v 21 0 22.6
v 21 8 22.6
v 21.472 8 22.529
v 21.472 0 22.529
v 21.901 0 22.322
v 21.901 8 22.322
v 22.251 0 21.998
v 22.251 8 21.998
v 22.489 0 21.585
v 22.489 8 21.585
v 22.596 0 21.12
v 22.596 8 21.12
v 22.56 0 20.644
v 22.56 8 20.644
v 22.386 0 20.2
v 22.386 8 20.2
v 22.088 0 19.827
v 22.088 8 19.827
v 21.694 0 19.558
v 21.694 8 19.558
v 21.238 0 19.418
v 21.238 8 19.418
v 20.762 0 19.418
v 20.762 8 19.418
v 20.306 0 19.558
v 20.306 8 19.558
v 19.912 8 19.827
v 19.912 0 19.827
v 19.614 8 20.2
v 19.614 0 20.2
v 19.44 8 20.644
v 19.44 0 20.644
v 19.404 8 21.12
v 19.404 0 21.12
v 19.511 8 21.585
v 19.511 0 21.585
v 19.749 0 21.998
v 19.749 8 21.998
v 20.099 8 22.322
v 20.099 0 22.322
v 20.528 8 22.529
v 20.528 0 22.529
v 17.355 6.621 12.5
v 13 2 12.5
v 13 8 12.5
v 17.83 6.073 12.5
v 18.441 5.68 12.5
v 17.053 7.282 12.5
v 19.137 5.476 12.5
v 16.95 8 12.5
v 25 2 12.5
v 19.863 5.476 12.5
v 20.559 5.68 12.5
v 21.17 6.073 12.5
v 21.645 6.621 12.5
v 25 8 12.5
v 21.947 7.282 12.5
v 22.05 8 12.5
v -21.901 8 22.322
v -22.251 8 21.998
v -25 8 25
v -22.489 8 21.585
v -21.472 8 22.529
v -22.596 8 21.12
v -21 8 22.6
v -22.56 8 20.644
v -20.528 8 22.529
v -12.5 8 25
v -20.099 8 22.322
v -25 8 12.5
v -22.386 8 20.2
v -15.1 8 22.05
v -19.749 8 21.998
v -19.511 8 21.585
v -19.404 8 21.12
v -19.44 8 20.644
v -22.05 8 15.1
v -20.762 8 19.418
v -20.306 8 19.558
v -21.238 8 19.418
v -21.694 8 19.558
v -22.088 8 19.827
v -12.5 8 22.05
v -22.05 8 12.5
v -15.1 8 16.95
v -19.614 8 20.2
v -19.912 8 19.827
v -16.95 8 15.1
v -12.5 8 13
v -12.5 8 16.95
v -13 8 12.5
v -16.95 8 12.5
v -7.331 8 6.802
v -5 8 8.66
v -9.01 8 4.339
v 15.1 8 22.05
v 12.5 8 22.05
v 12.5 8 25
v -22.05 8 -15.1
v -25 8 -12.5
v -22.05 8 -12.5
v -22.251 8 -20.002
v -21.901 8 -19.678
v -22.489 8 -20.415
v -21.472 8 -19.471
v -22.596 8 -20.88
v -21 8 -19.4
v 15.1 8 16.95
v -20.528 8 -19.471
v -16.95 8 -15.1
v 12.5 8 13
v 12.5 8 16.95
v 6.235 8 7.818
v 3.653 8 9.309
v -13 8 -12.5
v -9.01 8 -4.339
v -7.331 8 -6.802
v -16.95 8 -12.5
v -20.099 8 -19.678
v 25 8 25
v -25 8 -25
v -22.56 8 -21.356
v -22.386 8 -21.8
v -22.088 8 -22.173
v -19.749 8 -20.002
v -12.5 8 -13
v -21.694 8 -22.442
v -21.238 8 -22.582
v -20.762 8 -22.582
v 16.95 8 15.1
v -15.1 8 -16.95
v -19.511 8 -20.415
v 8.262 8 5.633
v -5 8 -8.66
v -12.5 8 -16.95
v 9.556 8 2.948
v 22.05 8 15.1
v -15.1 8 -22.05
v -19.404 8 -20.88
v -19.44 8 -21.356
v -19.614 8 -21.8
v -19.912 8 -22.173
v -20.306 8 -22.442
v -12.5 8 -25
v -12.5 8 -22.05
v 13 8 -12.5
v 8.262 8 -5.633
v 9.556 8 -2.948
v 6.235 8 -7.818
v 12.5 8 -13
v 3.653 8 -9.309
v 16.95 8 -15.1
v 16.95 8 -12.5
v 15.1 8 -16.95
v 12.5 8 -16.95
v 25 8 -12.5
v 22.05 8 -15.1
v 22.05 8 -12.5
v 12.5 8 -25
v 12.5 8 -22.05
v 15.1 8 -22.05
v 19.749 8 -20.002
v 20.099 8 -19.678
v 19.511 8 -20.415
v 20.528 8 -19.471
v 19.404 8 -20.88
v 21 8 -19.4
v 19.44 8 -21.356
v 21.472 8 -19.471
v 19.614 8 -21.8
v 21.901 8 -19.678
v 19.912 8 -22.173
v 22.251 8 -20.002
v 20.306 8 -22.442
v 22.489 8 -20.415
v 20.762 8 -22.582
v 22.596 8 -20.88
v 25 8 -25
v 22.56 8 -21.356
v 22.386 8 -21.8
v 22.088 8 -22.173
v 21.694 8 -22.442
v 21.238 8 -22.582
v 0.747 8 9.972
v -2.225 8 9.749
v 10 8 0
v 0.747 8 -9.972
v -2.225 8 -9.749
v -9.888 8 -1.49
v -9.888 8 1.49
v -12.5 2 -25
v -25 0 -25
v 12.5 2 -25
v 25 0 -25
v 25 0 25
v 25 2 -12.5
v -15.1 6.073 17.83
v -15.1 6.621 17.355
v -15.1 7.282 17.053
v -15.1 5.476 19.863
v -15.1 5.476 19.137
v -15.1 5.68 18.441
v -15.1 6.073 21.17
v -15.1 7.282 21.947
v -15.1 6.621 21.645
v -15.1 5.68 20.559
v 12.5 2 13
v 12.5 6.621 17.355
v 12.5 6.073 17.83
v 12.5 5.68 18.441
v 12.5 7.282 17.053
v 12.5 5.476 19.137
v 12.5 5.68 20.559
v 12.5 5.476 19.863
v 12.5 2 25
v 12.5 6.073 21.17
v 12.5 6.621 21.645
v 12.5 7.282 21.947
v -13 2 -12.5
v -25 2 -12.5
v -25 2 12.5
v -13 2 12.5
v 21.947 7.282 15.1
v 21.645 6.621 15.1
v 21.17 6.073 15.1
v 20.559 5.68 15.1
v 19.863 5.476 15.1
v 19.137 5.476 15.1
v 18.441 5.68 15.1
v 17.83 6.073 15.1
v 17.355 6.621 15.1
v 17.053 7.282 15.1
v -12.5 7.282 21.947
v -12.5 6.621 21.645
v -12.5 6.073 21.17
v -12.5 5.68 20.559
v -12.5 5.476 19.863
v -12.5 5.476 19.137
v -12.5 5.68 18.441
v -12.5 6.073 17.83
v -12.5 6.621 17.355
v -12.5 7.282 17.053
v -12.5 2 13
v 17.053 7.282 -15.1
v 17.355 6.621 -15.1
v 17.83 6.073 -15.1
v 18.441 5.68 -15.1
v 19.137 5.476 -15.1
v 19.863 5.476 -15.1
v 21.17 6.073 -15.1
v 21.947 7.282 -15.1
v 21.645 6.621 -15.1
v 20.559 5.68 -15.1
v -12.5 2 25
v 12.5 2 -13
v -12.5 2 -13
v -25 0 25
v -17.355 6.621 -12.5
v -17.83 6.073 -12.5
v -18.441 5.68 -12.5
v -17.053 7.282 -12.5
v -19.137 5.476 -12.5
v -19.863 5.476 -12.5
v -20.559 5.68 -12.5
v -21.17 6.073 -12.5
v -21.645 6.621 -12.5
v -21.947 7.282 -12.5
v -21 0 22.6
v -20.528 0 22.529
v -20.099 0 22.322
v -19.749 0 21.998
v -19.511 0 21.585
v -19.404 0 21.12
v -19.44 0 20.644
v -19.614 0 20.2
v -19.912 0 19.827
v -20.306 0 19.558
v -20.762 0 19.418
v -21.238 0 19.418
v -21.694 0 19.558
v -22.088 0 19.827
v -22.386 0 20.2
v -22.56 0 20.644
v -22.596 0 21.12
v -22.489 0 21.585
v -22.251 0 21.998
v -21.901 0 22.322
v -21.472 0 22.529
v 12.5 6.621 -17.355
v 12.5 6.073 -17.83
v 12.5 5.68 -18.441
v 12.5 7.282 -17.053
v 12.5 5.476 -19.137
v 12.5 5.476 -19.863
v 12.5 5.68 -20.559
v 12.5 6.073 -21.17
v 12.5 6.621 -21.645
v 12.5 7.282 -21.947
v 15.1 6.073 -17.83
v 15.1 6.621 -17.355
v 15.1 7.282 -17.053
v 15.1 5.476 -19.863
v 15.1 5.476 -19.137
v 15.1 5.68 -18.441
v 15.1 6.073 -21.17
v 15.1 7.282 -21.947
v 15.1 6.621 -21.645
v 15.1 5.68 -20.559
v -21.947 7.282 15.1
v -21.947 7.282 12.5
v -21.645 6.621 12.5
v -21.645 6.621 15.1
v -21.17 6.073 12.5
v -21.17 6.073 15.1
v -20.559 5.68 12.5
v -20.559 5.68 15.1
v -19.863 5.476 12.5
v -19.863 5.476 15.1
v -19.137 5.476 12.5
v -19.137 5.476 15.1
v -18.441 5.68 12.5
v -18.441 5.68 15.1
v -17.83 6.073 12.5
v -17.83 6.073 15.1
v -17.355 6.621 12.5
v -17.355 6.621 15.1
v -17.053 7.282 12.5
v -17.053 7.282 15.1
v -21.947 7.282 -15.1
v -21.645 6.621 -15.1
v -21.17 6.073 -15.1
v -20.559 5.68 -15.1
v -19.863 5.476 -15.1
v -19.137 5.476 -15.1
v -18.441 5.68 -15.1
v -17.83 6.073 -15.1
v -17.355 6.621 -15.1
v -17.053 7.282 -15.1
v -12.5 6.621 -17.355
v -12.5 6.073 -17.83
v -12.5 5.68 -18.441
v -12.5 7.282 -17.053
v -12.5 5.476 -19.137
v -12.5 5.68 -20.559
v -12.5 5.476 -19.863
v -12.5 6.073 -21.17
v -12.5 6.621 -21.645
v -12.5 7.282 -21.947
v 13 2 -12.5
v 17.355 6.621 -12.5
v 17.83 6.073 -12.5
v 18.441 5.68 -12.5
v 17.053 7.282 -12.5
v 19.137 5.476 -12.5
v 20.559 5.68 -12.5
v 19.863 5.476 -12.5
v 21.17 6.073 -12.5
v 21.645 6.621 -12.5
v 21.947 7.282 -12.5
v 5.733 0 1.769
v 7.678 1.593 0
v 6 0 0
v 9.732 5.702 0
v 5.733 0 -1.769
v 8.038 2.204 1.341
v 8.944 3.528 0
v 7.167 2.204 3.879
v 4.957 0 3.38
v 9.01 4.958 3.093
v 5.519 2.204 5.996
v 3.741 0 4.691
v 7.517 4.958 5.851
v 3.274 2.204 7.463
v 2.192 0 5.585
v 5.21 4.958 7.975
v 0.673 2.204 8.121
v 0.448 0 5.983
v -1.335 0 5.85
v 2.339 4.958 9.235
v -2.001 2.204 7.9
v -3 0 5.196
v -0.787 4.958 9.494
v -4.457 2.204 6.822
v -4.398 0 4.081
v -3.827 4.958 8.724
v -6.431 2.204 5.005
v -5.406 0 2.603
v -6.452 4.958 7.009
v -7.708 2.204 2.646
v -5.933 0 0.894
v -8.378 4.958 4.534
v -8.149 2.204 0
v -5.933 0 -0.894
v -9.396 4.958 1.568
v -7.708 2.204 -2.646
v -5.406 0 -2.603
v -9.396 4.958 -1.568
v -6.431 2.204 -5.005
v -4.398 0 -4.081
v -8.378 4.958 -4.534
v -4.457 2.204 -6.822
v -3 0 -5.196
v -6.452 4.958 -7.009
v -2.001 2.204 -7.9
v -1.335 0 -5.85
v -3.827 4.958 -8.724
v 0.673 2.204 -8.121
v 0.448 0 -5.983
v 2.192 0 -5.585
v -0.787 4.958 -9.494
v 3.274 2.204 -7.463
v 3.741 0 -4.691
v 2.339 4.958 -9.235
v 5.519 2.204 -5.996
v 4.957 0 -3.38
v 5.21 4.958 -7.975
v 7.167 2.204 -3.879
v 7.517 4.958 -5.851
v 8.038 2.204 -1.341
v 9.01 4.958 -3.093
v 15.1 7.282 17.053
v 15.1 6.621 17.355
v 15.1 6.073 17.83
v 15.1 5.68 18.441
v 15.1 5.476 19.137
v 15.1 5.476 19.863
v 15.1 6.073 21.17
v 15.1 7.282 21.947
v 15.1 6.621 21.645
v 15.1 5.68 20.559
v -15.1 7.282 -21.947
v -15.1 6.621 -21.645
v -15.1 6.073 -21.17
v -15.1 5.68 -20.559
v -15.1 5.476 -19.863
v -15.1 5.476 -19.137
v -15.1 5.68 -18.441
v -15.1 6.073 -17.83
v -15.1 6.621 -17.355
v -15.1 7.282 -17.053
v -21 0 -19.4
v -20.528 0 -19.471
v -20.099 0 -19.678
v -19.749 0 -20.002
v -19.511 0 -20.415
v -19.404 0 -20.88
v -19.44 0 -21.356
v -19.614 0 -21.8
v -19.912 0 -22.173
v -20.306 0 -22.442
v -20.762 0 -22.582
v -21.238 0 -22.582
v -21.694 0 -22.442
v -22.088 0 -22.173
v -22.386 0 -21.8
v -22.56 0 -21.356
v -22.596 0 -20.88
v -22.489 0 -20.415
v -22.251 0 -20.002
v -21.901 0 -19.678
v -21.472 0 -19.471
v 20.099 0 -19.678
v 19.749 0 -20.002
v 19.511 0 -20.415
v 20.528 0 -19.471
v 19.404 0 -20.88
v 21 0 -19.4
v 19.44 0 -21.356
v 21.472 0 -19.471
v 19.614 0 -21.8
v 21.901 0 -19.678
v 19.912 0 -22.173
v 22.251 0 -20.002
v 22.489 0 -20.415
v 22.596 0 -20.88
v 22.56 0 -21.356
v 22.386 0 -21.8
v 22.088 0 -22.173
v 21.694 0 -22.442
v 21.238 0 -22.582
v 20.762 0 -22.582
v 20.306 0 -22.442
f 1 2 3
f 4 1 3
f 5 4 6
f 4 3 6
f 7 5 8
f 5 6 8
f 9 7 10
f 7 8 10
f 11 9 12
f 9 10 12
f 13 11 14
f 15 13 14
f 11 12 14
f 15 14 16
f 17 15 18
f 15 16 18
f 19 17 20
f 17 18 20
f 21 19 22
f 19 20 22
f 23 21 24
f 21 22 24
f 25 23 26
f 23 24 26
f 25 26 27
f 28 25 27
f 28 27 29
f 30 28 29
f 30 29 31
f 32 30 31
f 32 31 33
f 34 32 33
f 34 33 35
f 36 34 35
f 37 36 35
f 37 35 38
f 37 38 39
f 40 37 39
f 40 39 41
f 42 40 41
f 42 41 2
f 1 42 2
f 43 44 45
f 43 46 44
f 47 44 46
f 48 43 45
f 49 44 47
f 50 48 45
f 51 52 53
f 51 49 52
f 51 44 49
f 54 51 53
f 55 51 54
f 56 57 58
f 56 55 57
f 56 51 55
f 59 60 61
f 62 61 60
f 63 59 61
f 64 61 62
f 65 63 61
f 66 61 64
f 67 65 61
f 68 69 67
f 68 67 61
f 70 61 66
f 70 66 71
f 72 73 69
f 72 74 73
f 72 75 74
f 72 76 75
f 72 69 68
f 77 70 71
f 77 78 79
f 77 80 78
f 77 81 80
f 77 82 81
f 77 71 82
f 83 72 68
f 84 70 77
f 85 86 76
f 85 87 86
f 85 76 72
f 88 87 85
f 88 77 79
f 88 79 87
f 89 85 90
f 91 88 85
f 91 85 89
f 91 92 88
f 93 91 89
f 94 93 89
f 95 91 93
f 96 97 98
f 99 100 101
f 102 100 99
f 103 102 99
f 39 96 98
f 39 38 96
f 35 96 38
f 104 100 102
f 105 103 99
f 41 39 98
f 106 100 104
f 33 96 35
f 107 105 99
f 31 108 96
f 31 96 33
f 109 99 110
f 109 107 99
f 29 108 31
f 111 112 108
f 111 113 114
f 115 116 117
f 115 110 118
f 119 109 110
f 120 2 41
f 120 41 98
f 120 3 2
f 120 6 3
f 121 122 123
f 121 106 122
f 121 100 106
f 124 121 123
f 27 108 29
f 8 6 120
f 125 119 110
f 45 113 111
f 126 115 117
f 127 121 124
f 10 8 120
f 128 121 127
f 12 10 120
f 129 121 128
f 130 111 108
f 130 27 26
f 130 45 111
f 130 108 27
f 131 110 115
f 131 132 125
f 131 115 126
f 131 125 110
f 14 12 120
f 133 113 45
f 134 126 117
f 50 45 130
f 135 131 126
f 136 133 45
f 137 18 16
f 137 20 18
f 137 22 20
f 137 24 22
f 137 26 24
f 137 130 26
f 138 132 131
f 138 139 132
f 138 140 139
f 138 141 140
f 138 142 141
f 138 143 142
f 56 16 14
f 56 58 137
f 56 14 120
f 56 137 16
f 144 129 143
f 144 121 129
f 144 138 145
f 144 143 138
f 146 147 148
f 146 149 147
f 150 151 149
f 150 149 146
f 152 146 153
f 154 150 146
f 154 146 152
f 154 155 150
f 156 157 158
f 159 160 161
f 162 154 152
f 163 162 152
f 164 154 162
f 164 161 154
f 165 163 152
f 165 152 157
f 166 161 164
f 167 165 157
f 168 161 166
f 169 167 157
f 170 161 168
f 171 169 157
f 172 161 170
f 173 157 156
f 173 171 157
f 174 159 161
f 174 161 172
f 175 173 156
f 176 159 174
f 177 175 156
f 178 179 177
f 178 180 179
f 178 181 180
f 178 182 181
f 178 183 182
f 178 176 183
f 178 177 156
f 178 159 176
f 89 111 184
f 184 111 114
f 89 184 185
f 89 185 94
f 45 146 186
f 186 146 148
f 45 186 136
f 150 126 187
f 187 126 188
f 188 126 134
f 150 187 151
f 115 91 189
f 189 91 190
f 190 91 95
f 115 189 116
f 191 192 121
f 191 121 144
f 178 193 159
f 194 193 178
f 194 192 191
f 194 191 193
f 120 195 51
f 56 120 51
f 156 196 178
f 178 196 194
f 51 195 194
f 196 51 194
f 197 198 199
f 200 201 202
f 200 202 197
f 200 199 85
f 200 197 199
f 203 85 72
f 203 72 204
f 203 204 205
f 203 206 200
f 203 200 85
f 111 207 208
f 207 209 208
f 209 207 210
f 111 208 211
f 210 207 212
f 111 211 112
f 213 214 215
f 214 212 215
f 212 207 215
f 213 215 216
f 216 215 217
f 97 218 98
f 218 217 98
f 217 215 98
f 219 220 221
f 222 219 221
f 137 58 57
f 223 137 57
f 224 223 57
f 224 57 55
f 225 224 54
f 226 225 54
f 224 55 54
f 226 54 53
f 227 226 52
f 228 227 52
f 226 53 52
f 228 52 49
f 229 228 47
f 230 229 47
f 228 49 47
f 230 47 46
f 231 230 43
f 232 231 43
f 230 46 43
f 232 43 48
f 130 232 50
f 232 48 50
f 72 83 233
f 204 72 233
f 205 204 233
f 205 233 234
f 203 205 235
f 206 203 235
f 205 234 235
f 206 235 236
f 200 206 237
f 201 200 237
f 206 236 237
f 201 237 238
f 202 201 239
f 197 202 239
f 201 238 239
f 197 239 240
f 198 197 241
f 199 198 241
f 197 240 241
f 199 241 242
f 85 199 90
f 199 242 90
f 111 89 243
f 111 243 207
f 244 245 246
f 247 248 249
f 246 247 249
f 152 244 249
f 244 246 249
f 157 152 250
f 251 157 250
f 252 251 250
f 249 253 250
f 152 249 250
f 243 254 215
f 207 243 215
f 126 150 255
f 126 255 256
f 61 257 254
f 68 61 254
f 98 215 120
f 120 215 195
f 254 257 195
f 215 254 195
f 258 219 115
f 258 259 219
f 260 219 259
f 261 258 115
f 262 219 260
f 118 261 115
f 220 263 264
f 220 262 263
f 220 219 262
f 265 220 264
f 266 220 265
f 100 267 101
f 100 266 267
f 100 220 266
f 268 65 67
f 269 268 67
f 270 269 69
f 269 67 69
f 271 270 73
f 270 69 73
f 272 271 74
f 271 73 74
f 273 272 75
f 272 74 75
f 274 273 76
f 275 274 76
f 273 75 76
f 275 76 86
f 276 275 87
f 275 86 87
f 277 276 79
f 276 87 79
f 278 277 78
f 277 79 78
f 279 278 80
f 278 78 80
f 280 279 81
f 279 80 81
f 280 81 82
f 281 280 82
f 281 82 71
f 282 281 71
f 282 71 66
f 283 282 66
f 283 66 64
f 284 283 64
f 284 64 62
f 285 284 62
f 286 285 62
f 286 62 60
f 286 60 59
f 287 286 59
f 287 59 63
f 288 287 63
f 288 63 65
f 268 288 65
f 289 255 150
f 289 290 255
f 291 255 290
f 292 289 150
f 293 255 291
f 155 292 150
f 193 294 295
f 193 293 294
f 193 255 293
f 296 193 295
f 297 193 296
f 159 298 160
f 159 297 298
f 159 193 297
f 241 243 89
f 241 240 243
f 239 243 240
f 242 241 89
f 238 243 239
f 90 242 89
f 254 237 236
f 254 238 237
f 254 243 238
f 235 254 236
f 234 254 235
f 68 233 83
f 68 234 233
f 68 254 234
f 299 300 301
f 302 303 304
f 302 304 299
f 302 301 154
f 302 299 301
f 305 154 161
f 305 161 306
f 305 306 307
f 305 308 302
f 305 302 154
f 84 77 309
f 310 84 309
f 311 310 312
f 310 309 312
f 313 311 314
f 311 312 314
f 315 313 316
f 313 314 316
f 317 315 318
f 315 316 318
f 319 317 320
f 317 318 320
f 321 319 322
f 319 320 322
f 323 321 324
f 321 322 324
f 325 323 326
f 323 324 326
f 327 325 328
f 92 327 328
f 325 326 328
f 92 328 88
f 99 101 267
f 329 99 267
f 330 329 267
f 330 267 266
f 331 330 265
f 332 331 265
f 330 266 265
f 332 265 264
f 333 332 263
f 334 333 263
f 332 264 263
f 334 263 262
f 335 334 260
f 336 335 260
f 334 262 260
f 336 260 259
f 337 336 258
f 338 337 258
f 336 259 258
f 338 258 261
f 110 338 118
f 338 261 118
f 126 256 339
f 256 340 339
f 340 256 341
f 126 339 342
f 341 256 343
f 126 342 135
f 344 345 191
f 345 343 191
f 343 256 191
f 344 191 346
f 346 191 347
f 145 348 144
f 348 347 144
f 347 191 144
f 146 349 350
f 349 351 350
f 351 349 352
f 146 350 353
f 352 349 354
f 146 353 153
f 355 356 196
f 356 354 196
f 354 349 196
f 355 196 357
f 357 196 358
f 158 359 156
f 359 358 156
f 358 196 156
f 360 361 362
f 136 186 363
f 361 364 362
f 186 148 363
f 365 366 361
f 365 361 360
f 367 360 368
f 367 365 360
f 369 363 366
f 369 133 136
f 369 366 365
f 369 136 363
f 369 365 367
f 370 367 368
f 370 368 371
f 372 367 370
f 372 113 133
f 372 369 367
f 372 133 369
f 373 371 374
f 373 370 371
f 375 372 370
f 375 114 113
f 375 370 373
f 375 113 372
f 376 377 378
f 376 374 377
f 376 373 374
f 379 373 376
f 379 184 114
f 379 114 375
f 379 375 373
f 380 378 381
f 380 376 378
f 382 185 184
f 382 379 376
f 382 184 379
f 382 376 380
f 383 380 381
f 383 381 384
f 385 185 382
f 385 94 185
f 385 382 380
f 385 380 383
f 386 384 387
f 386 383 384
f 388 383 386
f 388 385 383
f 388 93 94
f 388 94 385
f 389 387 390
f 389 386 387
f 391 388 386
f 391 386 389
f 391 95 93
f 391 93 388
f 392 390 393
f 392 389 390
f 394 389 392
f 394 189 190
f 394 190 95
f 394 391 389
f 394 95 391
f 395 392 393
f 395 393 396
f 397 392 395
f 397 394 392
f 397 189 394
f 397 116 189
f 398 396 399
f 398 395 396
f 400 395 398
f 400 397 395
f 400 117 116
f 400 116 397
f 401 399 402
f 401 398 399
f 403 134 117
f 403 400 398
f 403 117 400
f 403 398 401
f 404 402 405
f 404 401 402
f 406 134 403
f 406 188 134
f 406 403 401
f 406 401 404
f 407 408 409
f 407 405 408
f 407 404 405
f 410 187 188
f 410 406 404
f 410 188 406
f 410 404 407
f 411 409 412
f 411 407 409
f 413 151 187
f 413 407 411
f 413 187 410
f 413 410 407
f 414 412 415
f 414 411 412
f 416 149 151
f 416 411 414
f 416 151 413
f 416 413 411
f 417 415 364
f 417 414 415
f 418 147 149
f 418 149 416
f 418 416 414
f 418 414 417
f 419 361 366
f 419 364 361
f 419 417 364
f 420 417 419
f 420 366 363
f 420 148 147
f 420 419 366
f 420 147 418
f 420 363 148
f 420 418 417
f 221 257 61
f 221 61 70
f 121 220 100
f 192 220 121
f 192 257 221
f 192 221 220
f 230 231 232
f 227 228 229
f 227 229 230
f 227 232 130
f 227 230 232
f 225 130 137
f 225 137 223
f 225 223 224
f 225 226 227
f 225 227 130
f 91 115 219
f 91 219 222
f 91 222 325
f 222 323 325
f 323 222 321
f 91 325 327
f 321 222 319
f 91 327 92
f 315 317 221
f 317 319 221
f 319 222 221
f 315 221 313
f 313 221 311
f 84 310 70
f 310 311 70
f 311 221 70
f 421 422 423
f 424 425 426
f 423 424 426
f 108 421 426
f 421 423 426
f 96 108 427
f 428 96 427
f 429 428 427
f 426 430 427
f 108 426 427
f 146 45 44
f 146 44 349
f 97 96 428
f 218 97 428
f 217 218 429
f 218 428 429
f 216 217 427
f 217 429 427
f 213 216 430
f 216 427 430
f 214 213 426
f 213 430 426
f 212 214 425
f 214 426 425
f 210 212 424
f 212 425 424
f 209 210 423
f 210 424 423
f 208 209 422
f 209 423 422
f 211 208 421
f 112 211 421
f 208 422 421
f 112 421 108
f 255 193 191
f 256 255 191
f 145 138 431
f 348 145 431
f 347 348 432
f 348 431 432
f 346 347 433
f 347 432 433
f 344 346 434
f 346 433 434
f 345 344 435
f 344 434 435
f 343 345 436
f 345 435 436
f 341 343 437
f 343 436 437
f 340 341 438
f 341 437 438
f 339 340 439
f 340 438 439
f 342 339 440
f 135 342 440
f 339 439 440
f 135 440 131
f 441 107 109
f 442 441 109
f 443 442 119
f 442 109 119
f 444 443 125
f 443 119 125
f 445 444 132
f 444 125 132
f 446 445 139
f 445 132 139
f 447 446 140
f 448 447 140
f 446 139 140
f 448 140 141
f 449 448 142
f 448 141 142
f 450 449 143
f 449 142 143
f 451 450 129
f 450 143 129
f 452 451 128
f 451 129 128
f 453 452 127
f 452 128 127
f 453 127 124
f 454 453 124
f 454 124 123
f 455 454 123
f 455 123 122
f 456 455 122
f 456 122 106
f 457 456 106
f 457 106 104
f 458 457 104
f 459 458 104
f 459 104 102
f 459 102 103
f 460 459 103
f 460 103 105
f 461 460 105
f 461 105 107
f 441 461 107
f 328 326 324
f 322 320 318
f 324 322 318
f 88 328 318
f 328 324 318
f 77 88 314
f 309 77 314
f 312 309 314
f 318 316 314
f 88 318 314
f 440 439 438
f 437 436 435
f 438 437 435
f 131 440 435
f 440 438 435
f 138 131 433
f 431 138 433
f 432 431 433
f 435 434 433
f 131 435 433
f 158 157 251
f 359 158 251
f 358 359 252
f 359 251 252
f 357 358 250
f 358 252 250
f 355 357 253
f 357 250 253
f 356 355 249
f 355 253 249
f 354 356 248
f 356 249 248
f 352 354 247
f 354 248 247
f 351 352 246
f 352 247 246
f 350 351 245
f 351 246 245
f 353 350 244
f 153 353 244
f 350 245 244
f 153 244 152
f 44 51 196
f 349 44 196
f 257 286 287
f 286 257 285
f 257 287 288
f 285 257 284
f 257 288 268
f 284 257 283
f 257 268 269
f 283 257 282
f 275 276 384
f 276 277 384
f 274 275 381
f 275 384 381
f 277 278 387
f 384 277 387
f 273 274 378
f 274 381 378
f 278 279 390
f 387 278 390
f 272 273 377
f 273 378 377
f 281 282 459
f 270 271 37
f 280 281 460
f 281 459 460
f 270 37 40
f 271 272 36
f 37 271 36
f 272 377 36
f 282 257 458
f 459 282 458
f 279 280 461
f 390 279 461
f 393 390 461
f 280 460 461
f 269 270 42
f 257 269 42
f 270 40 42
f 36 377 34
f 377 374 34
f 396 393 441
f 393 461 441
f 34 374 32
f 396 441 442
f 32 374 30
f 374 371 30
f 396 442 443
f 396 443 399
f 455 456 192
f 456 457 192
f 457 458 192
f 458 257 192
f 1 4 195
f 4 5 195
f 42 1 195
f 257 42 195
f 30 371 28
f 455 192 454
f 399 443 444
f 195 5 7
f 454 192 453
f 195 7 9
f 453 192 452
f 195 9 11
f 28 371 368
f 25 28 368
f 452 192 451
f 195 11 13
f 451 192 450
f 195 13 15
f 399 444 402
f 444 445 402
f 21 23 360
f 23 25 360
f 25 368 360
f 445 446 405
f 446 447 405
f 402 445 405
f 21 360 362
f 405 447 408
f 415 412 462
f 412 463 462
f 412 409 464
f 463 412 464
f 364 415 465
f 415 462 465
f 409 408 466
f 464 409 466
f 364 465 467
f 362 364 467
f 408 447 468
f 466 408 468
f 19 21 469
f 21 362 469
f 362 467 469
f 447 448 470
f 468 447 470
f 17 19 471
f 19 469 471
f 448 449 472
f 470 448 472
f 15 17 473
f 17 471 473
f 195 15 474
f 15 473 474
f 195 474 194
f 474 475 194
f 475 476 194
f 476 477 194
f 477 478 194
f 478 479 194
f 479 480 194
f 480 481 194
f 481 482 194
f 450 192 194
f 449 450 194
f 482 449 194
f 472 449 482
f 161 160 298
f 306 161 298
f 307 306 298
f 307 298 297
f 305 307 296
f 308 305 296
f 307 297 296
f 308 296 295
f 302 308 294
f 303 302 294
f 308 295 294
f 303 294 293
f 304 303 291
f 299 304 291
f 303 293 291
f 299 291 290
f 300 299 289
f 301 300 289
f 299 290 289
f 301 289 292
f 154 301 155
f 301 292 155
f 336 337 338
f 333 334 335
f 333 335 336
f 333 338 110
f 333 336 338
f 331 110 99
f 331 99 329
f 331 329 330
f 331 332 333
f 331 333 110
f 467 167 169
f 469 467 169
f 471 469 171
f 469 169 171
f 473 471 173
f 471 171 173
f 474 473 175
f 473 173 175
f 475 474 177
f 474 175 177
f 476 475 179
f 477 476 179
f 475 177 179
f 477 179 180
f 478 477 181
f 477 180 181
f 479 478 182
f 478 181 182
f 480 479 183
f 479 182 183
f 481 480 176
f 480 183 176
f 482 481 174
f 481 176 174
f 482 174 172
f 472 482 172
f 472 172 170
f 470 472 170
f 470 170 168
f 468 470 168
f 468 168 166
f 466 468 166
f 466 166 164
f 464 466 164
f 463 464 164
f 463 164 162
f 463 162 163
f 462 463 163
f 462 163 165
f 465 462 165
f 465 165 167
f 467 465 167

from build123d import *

# Parameters (mm, degrees)
SKETCH_1_W               = 50
SKETCH_1_H               = 50
EXTRUDE_1_DEPTH          = 16
SKETCH_3_R               = 1.6
CUT_EXTRUDE_1_DEPTH      = 39.807215824
SKETCH_6_W               = 25
SKETCH_6_H               = 12
CUT_EXTRUDE_3_DEPTH      = 12
SKETCH_7_R               = 2.55
CUT_EXTRUDE_4_DEPTH      = 15.1
PATTERN_CIRCULAR_2_COUNT = 4
SKETCH_8_W               = 50
SKETCH_8_H               = 50
CUT_EXTRUDE_5_DEPTH      = 8


with BuildPart() as part:
    # 草图1 → 凸台-拉伸1 (new body)
    with BuildSketch(Plane(origin=(0, 0, 0), x_dir=(1, 0, 0), z_dir=(0, 1, 0))):
        Rectangle(SKETCH_1_W, SKETCH_1_H)
    extrude(amount=EXTRUDE_1_DEPTH)

    # 草图2 → 切除-旋转1 (revolve, cut)
    with BuildSketch(Plane.XY):
        with BuildLine():
            Line((0, 18), (0, -2))
            ThreePointArc((0, -2), (10, 8), (0, 18))
        make_face()
    revolve(axis=Axis((0, 16, 0), (0, -1, 0)), mode=Mode.SUBTRACT)

    # 草图3 → 切除-拉伸1 (cut, through all)
    with BuildSketch(Plane(origin=(0, 16, 0), x_dir=(1, 0, 0), z_dir=(0, 1, 0))):
        with Locations(Location((-21, 21, 0), (0, 0, 270))):
            Circle(SKETCH_3_R)
        with Locations(Location((21, 21, 0), (0, 0, 270))):
            Circle(SKETCH_3_R)
        with Locations(Location((21, -21, 0), (0, 0, 270))):
            Circle(SKETCH_3_R)
        with Locations(Location((-21, -21, 0), (0, 0, 270))):
            Circle(SKETCH_3_R)
    extrude(amount=-CUT_EXTRUDE_1_DEPTH, mode=Mode.SUBTRACT)

    # 草图6 → 切除-拉伸3 (cut)
    with BuildSketch(Plane.XY.offset(25)):
        with Locations((0, 8)):
            Rectangle(SKETCH_6_W, SKETCH_6_H)
    cut_extrude_3 = extrude(amount=-CUT_EXTRUDE_3_DEPTH, mode=Mode.SUBTRACT)

    # 草图7 → 切除-拉伸4 (cut, symmetric)
    with BuildSketch(Plane(origin=(0, 0, 0), x_dir=(0, 0, -1), z_dir=(1, 0, 0))):
        with Locations(Location((-19.5, 8, 0), (0, 0, 180))):
            Circle(SKETCH_7_R)
    cut_extrude_4 = extrude(amount=CUT_EXTRUDE_4_DEPTH, both=True, mode=Mode.SUBTRACT)

    # 阵列(圆周)2: 切除-拉伸3, 切除-拉伸4 ×4 about axis
    pattern_circular_2_axis = Axis((0, 0, 0), (0, 1, 0))
    add([cut_extrude_3.rotate(pattern_circular_2_axis, i * 360 / PATTERN_CIRCULAR_2_COUNT) for i in range(1, PATTERN_CIRCULAR_2_COUNT)], mode=Mode.SUBTRACT)
    add([cut_extrude_4.rotate(pattern_circular_2_axis, i * 360 / PATTERN_CIRCULAR_2_COUNT) for i in range(1, PATTERN_CIRCULAR_2_COUNT)], mode=Mode.SUBTRACT)

    # 草图8 → 切除-拉伸5 (cut)
    with BuildSketch(Plane(origin=(0, 16, 0), x_dir=(1, 0, 0), z_dir=(0, 1, 0))):
        Rectangle(SKETCH_8_W, SKETCH_8_H)
    extrude(amount=-CUT_EXTRUDE_5_DEPTH, mode=Mode.SUBTRACT)


solid = part.part
